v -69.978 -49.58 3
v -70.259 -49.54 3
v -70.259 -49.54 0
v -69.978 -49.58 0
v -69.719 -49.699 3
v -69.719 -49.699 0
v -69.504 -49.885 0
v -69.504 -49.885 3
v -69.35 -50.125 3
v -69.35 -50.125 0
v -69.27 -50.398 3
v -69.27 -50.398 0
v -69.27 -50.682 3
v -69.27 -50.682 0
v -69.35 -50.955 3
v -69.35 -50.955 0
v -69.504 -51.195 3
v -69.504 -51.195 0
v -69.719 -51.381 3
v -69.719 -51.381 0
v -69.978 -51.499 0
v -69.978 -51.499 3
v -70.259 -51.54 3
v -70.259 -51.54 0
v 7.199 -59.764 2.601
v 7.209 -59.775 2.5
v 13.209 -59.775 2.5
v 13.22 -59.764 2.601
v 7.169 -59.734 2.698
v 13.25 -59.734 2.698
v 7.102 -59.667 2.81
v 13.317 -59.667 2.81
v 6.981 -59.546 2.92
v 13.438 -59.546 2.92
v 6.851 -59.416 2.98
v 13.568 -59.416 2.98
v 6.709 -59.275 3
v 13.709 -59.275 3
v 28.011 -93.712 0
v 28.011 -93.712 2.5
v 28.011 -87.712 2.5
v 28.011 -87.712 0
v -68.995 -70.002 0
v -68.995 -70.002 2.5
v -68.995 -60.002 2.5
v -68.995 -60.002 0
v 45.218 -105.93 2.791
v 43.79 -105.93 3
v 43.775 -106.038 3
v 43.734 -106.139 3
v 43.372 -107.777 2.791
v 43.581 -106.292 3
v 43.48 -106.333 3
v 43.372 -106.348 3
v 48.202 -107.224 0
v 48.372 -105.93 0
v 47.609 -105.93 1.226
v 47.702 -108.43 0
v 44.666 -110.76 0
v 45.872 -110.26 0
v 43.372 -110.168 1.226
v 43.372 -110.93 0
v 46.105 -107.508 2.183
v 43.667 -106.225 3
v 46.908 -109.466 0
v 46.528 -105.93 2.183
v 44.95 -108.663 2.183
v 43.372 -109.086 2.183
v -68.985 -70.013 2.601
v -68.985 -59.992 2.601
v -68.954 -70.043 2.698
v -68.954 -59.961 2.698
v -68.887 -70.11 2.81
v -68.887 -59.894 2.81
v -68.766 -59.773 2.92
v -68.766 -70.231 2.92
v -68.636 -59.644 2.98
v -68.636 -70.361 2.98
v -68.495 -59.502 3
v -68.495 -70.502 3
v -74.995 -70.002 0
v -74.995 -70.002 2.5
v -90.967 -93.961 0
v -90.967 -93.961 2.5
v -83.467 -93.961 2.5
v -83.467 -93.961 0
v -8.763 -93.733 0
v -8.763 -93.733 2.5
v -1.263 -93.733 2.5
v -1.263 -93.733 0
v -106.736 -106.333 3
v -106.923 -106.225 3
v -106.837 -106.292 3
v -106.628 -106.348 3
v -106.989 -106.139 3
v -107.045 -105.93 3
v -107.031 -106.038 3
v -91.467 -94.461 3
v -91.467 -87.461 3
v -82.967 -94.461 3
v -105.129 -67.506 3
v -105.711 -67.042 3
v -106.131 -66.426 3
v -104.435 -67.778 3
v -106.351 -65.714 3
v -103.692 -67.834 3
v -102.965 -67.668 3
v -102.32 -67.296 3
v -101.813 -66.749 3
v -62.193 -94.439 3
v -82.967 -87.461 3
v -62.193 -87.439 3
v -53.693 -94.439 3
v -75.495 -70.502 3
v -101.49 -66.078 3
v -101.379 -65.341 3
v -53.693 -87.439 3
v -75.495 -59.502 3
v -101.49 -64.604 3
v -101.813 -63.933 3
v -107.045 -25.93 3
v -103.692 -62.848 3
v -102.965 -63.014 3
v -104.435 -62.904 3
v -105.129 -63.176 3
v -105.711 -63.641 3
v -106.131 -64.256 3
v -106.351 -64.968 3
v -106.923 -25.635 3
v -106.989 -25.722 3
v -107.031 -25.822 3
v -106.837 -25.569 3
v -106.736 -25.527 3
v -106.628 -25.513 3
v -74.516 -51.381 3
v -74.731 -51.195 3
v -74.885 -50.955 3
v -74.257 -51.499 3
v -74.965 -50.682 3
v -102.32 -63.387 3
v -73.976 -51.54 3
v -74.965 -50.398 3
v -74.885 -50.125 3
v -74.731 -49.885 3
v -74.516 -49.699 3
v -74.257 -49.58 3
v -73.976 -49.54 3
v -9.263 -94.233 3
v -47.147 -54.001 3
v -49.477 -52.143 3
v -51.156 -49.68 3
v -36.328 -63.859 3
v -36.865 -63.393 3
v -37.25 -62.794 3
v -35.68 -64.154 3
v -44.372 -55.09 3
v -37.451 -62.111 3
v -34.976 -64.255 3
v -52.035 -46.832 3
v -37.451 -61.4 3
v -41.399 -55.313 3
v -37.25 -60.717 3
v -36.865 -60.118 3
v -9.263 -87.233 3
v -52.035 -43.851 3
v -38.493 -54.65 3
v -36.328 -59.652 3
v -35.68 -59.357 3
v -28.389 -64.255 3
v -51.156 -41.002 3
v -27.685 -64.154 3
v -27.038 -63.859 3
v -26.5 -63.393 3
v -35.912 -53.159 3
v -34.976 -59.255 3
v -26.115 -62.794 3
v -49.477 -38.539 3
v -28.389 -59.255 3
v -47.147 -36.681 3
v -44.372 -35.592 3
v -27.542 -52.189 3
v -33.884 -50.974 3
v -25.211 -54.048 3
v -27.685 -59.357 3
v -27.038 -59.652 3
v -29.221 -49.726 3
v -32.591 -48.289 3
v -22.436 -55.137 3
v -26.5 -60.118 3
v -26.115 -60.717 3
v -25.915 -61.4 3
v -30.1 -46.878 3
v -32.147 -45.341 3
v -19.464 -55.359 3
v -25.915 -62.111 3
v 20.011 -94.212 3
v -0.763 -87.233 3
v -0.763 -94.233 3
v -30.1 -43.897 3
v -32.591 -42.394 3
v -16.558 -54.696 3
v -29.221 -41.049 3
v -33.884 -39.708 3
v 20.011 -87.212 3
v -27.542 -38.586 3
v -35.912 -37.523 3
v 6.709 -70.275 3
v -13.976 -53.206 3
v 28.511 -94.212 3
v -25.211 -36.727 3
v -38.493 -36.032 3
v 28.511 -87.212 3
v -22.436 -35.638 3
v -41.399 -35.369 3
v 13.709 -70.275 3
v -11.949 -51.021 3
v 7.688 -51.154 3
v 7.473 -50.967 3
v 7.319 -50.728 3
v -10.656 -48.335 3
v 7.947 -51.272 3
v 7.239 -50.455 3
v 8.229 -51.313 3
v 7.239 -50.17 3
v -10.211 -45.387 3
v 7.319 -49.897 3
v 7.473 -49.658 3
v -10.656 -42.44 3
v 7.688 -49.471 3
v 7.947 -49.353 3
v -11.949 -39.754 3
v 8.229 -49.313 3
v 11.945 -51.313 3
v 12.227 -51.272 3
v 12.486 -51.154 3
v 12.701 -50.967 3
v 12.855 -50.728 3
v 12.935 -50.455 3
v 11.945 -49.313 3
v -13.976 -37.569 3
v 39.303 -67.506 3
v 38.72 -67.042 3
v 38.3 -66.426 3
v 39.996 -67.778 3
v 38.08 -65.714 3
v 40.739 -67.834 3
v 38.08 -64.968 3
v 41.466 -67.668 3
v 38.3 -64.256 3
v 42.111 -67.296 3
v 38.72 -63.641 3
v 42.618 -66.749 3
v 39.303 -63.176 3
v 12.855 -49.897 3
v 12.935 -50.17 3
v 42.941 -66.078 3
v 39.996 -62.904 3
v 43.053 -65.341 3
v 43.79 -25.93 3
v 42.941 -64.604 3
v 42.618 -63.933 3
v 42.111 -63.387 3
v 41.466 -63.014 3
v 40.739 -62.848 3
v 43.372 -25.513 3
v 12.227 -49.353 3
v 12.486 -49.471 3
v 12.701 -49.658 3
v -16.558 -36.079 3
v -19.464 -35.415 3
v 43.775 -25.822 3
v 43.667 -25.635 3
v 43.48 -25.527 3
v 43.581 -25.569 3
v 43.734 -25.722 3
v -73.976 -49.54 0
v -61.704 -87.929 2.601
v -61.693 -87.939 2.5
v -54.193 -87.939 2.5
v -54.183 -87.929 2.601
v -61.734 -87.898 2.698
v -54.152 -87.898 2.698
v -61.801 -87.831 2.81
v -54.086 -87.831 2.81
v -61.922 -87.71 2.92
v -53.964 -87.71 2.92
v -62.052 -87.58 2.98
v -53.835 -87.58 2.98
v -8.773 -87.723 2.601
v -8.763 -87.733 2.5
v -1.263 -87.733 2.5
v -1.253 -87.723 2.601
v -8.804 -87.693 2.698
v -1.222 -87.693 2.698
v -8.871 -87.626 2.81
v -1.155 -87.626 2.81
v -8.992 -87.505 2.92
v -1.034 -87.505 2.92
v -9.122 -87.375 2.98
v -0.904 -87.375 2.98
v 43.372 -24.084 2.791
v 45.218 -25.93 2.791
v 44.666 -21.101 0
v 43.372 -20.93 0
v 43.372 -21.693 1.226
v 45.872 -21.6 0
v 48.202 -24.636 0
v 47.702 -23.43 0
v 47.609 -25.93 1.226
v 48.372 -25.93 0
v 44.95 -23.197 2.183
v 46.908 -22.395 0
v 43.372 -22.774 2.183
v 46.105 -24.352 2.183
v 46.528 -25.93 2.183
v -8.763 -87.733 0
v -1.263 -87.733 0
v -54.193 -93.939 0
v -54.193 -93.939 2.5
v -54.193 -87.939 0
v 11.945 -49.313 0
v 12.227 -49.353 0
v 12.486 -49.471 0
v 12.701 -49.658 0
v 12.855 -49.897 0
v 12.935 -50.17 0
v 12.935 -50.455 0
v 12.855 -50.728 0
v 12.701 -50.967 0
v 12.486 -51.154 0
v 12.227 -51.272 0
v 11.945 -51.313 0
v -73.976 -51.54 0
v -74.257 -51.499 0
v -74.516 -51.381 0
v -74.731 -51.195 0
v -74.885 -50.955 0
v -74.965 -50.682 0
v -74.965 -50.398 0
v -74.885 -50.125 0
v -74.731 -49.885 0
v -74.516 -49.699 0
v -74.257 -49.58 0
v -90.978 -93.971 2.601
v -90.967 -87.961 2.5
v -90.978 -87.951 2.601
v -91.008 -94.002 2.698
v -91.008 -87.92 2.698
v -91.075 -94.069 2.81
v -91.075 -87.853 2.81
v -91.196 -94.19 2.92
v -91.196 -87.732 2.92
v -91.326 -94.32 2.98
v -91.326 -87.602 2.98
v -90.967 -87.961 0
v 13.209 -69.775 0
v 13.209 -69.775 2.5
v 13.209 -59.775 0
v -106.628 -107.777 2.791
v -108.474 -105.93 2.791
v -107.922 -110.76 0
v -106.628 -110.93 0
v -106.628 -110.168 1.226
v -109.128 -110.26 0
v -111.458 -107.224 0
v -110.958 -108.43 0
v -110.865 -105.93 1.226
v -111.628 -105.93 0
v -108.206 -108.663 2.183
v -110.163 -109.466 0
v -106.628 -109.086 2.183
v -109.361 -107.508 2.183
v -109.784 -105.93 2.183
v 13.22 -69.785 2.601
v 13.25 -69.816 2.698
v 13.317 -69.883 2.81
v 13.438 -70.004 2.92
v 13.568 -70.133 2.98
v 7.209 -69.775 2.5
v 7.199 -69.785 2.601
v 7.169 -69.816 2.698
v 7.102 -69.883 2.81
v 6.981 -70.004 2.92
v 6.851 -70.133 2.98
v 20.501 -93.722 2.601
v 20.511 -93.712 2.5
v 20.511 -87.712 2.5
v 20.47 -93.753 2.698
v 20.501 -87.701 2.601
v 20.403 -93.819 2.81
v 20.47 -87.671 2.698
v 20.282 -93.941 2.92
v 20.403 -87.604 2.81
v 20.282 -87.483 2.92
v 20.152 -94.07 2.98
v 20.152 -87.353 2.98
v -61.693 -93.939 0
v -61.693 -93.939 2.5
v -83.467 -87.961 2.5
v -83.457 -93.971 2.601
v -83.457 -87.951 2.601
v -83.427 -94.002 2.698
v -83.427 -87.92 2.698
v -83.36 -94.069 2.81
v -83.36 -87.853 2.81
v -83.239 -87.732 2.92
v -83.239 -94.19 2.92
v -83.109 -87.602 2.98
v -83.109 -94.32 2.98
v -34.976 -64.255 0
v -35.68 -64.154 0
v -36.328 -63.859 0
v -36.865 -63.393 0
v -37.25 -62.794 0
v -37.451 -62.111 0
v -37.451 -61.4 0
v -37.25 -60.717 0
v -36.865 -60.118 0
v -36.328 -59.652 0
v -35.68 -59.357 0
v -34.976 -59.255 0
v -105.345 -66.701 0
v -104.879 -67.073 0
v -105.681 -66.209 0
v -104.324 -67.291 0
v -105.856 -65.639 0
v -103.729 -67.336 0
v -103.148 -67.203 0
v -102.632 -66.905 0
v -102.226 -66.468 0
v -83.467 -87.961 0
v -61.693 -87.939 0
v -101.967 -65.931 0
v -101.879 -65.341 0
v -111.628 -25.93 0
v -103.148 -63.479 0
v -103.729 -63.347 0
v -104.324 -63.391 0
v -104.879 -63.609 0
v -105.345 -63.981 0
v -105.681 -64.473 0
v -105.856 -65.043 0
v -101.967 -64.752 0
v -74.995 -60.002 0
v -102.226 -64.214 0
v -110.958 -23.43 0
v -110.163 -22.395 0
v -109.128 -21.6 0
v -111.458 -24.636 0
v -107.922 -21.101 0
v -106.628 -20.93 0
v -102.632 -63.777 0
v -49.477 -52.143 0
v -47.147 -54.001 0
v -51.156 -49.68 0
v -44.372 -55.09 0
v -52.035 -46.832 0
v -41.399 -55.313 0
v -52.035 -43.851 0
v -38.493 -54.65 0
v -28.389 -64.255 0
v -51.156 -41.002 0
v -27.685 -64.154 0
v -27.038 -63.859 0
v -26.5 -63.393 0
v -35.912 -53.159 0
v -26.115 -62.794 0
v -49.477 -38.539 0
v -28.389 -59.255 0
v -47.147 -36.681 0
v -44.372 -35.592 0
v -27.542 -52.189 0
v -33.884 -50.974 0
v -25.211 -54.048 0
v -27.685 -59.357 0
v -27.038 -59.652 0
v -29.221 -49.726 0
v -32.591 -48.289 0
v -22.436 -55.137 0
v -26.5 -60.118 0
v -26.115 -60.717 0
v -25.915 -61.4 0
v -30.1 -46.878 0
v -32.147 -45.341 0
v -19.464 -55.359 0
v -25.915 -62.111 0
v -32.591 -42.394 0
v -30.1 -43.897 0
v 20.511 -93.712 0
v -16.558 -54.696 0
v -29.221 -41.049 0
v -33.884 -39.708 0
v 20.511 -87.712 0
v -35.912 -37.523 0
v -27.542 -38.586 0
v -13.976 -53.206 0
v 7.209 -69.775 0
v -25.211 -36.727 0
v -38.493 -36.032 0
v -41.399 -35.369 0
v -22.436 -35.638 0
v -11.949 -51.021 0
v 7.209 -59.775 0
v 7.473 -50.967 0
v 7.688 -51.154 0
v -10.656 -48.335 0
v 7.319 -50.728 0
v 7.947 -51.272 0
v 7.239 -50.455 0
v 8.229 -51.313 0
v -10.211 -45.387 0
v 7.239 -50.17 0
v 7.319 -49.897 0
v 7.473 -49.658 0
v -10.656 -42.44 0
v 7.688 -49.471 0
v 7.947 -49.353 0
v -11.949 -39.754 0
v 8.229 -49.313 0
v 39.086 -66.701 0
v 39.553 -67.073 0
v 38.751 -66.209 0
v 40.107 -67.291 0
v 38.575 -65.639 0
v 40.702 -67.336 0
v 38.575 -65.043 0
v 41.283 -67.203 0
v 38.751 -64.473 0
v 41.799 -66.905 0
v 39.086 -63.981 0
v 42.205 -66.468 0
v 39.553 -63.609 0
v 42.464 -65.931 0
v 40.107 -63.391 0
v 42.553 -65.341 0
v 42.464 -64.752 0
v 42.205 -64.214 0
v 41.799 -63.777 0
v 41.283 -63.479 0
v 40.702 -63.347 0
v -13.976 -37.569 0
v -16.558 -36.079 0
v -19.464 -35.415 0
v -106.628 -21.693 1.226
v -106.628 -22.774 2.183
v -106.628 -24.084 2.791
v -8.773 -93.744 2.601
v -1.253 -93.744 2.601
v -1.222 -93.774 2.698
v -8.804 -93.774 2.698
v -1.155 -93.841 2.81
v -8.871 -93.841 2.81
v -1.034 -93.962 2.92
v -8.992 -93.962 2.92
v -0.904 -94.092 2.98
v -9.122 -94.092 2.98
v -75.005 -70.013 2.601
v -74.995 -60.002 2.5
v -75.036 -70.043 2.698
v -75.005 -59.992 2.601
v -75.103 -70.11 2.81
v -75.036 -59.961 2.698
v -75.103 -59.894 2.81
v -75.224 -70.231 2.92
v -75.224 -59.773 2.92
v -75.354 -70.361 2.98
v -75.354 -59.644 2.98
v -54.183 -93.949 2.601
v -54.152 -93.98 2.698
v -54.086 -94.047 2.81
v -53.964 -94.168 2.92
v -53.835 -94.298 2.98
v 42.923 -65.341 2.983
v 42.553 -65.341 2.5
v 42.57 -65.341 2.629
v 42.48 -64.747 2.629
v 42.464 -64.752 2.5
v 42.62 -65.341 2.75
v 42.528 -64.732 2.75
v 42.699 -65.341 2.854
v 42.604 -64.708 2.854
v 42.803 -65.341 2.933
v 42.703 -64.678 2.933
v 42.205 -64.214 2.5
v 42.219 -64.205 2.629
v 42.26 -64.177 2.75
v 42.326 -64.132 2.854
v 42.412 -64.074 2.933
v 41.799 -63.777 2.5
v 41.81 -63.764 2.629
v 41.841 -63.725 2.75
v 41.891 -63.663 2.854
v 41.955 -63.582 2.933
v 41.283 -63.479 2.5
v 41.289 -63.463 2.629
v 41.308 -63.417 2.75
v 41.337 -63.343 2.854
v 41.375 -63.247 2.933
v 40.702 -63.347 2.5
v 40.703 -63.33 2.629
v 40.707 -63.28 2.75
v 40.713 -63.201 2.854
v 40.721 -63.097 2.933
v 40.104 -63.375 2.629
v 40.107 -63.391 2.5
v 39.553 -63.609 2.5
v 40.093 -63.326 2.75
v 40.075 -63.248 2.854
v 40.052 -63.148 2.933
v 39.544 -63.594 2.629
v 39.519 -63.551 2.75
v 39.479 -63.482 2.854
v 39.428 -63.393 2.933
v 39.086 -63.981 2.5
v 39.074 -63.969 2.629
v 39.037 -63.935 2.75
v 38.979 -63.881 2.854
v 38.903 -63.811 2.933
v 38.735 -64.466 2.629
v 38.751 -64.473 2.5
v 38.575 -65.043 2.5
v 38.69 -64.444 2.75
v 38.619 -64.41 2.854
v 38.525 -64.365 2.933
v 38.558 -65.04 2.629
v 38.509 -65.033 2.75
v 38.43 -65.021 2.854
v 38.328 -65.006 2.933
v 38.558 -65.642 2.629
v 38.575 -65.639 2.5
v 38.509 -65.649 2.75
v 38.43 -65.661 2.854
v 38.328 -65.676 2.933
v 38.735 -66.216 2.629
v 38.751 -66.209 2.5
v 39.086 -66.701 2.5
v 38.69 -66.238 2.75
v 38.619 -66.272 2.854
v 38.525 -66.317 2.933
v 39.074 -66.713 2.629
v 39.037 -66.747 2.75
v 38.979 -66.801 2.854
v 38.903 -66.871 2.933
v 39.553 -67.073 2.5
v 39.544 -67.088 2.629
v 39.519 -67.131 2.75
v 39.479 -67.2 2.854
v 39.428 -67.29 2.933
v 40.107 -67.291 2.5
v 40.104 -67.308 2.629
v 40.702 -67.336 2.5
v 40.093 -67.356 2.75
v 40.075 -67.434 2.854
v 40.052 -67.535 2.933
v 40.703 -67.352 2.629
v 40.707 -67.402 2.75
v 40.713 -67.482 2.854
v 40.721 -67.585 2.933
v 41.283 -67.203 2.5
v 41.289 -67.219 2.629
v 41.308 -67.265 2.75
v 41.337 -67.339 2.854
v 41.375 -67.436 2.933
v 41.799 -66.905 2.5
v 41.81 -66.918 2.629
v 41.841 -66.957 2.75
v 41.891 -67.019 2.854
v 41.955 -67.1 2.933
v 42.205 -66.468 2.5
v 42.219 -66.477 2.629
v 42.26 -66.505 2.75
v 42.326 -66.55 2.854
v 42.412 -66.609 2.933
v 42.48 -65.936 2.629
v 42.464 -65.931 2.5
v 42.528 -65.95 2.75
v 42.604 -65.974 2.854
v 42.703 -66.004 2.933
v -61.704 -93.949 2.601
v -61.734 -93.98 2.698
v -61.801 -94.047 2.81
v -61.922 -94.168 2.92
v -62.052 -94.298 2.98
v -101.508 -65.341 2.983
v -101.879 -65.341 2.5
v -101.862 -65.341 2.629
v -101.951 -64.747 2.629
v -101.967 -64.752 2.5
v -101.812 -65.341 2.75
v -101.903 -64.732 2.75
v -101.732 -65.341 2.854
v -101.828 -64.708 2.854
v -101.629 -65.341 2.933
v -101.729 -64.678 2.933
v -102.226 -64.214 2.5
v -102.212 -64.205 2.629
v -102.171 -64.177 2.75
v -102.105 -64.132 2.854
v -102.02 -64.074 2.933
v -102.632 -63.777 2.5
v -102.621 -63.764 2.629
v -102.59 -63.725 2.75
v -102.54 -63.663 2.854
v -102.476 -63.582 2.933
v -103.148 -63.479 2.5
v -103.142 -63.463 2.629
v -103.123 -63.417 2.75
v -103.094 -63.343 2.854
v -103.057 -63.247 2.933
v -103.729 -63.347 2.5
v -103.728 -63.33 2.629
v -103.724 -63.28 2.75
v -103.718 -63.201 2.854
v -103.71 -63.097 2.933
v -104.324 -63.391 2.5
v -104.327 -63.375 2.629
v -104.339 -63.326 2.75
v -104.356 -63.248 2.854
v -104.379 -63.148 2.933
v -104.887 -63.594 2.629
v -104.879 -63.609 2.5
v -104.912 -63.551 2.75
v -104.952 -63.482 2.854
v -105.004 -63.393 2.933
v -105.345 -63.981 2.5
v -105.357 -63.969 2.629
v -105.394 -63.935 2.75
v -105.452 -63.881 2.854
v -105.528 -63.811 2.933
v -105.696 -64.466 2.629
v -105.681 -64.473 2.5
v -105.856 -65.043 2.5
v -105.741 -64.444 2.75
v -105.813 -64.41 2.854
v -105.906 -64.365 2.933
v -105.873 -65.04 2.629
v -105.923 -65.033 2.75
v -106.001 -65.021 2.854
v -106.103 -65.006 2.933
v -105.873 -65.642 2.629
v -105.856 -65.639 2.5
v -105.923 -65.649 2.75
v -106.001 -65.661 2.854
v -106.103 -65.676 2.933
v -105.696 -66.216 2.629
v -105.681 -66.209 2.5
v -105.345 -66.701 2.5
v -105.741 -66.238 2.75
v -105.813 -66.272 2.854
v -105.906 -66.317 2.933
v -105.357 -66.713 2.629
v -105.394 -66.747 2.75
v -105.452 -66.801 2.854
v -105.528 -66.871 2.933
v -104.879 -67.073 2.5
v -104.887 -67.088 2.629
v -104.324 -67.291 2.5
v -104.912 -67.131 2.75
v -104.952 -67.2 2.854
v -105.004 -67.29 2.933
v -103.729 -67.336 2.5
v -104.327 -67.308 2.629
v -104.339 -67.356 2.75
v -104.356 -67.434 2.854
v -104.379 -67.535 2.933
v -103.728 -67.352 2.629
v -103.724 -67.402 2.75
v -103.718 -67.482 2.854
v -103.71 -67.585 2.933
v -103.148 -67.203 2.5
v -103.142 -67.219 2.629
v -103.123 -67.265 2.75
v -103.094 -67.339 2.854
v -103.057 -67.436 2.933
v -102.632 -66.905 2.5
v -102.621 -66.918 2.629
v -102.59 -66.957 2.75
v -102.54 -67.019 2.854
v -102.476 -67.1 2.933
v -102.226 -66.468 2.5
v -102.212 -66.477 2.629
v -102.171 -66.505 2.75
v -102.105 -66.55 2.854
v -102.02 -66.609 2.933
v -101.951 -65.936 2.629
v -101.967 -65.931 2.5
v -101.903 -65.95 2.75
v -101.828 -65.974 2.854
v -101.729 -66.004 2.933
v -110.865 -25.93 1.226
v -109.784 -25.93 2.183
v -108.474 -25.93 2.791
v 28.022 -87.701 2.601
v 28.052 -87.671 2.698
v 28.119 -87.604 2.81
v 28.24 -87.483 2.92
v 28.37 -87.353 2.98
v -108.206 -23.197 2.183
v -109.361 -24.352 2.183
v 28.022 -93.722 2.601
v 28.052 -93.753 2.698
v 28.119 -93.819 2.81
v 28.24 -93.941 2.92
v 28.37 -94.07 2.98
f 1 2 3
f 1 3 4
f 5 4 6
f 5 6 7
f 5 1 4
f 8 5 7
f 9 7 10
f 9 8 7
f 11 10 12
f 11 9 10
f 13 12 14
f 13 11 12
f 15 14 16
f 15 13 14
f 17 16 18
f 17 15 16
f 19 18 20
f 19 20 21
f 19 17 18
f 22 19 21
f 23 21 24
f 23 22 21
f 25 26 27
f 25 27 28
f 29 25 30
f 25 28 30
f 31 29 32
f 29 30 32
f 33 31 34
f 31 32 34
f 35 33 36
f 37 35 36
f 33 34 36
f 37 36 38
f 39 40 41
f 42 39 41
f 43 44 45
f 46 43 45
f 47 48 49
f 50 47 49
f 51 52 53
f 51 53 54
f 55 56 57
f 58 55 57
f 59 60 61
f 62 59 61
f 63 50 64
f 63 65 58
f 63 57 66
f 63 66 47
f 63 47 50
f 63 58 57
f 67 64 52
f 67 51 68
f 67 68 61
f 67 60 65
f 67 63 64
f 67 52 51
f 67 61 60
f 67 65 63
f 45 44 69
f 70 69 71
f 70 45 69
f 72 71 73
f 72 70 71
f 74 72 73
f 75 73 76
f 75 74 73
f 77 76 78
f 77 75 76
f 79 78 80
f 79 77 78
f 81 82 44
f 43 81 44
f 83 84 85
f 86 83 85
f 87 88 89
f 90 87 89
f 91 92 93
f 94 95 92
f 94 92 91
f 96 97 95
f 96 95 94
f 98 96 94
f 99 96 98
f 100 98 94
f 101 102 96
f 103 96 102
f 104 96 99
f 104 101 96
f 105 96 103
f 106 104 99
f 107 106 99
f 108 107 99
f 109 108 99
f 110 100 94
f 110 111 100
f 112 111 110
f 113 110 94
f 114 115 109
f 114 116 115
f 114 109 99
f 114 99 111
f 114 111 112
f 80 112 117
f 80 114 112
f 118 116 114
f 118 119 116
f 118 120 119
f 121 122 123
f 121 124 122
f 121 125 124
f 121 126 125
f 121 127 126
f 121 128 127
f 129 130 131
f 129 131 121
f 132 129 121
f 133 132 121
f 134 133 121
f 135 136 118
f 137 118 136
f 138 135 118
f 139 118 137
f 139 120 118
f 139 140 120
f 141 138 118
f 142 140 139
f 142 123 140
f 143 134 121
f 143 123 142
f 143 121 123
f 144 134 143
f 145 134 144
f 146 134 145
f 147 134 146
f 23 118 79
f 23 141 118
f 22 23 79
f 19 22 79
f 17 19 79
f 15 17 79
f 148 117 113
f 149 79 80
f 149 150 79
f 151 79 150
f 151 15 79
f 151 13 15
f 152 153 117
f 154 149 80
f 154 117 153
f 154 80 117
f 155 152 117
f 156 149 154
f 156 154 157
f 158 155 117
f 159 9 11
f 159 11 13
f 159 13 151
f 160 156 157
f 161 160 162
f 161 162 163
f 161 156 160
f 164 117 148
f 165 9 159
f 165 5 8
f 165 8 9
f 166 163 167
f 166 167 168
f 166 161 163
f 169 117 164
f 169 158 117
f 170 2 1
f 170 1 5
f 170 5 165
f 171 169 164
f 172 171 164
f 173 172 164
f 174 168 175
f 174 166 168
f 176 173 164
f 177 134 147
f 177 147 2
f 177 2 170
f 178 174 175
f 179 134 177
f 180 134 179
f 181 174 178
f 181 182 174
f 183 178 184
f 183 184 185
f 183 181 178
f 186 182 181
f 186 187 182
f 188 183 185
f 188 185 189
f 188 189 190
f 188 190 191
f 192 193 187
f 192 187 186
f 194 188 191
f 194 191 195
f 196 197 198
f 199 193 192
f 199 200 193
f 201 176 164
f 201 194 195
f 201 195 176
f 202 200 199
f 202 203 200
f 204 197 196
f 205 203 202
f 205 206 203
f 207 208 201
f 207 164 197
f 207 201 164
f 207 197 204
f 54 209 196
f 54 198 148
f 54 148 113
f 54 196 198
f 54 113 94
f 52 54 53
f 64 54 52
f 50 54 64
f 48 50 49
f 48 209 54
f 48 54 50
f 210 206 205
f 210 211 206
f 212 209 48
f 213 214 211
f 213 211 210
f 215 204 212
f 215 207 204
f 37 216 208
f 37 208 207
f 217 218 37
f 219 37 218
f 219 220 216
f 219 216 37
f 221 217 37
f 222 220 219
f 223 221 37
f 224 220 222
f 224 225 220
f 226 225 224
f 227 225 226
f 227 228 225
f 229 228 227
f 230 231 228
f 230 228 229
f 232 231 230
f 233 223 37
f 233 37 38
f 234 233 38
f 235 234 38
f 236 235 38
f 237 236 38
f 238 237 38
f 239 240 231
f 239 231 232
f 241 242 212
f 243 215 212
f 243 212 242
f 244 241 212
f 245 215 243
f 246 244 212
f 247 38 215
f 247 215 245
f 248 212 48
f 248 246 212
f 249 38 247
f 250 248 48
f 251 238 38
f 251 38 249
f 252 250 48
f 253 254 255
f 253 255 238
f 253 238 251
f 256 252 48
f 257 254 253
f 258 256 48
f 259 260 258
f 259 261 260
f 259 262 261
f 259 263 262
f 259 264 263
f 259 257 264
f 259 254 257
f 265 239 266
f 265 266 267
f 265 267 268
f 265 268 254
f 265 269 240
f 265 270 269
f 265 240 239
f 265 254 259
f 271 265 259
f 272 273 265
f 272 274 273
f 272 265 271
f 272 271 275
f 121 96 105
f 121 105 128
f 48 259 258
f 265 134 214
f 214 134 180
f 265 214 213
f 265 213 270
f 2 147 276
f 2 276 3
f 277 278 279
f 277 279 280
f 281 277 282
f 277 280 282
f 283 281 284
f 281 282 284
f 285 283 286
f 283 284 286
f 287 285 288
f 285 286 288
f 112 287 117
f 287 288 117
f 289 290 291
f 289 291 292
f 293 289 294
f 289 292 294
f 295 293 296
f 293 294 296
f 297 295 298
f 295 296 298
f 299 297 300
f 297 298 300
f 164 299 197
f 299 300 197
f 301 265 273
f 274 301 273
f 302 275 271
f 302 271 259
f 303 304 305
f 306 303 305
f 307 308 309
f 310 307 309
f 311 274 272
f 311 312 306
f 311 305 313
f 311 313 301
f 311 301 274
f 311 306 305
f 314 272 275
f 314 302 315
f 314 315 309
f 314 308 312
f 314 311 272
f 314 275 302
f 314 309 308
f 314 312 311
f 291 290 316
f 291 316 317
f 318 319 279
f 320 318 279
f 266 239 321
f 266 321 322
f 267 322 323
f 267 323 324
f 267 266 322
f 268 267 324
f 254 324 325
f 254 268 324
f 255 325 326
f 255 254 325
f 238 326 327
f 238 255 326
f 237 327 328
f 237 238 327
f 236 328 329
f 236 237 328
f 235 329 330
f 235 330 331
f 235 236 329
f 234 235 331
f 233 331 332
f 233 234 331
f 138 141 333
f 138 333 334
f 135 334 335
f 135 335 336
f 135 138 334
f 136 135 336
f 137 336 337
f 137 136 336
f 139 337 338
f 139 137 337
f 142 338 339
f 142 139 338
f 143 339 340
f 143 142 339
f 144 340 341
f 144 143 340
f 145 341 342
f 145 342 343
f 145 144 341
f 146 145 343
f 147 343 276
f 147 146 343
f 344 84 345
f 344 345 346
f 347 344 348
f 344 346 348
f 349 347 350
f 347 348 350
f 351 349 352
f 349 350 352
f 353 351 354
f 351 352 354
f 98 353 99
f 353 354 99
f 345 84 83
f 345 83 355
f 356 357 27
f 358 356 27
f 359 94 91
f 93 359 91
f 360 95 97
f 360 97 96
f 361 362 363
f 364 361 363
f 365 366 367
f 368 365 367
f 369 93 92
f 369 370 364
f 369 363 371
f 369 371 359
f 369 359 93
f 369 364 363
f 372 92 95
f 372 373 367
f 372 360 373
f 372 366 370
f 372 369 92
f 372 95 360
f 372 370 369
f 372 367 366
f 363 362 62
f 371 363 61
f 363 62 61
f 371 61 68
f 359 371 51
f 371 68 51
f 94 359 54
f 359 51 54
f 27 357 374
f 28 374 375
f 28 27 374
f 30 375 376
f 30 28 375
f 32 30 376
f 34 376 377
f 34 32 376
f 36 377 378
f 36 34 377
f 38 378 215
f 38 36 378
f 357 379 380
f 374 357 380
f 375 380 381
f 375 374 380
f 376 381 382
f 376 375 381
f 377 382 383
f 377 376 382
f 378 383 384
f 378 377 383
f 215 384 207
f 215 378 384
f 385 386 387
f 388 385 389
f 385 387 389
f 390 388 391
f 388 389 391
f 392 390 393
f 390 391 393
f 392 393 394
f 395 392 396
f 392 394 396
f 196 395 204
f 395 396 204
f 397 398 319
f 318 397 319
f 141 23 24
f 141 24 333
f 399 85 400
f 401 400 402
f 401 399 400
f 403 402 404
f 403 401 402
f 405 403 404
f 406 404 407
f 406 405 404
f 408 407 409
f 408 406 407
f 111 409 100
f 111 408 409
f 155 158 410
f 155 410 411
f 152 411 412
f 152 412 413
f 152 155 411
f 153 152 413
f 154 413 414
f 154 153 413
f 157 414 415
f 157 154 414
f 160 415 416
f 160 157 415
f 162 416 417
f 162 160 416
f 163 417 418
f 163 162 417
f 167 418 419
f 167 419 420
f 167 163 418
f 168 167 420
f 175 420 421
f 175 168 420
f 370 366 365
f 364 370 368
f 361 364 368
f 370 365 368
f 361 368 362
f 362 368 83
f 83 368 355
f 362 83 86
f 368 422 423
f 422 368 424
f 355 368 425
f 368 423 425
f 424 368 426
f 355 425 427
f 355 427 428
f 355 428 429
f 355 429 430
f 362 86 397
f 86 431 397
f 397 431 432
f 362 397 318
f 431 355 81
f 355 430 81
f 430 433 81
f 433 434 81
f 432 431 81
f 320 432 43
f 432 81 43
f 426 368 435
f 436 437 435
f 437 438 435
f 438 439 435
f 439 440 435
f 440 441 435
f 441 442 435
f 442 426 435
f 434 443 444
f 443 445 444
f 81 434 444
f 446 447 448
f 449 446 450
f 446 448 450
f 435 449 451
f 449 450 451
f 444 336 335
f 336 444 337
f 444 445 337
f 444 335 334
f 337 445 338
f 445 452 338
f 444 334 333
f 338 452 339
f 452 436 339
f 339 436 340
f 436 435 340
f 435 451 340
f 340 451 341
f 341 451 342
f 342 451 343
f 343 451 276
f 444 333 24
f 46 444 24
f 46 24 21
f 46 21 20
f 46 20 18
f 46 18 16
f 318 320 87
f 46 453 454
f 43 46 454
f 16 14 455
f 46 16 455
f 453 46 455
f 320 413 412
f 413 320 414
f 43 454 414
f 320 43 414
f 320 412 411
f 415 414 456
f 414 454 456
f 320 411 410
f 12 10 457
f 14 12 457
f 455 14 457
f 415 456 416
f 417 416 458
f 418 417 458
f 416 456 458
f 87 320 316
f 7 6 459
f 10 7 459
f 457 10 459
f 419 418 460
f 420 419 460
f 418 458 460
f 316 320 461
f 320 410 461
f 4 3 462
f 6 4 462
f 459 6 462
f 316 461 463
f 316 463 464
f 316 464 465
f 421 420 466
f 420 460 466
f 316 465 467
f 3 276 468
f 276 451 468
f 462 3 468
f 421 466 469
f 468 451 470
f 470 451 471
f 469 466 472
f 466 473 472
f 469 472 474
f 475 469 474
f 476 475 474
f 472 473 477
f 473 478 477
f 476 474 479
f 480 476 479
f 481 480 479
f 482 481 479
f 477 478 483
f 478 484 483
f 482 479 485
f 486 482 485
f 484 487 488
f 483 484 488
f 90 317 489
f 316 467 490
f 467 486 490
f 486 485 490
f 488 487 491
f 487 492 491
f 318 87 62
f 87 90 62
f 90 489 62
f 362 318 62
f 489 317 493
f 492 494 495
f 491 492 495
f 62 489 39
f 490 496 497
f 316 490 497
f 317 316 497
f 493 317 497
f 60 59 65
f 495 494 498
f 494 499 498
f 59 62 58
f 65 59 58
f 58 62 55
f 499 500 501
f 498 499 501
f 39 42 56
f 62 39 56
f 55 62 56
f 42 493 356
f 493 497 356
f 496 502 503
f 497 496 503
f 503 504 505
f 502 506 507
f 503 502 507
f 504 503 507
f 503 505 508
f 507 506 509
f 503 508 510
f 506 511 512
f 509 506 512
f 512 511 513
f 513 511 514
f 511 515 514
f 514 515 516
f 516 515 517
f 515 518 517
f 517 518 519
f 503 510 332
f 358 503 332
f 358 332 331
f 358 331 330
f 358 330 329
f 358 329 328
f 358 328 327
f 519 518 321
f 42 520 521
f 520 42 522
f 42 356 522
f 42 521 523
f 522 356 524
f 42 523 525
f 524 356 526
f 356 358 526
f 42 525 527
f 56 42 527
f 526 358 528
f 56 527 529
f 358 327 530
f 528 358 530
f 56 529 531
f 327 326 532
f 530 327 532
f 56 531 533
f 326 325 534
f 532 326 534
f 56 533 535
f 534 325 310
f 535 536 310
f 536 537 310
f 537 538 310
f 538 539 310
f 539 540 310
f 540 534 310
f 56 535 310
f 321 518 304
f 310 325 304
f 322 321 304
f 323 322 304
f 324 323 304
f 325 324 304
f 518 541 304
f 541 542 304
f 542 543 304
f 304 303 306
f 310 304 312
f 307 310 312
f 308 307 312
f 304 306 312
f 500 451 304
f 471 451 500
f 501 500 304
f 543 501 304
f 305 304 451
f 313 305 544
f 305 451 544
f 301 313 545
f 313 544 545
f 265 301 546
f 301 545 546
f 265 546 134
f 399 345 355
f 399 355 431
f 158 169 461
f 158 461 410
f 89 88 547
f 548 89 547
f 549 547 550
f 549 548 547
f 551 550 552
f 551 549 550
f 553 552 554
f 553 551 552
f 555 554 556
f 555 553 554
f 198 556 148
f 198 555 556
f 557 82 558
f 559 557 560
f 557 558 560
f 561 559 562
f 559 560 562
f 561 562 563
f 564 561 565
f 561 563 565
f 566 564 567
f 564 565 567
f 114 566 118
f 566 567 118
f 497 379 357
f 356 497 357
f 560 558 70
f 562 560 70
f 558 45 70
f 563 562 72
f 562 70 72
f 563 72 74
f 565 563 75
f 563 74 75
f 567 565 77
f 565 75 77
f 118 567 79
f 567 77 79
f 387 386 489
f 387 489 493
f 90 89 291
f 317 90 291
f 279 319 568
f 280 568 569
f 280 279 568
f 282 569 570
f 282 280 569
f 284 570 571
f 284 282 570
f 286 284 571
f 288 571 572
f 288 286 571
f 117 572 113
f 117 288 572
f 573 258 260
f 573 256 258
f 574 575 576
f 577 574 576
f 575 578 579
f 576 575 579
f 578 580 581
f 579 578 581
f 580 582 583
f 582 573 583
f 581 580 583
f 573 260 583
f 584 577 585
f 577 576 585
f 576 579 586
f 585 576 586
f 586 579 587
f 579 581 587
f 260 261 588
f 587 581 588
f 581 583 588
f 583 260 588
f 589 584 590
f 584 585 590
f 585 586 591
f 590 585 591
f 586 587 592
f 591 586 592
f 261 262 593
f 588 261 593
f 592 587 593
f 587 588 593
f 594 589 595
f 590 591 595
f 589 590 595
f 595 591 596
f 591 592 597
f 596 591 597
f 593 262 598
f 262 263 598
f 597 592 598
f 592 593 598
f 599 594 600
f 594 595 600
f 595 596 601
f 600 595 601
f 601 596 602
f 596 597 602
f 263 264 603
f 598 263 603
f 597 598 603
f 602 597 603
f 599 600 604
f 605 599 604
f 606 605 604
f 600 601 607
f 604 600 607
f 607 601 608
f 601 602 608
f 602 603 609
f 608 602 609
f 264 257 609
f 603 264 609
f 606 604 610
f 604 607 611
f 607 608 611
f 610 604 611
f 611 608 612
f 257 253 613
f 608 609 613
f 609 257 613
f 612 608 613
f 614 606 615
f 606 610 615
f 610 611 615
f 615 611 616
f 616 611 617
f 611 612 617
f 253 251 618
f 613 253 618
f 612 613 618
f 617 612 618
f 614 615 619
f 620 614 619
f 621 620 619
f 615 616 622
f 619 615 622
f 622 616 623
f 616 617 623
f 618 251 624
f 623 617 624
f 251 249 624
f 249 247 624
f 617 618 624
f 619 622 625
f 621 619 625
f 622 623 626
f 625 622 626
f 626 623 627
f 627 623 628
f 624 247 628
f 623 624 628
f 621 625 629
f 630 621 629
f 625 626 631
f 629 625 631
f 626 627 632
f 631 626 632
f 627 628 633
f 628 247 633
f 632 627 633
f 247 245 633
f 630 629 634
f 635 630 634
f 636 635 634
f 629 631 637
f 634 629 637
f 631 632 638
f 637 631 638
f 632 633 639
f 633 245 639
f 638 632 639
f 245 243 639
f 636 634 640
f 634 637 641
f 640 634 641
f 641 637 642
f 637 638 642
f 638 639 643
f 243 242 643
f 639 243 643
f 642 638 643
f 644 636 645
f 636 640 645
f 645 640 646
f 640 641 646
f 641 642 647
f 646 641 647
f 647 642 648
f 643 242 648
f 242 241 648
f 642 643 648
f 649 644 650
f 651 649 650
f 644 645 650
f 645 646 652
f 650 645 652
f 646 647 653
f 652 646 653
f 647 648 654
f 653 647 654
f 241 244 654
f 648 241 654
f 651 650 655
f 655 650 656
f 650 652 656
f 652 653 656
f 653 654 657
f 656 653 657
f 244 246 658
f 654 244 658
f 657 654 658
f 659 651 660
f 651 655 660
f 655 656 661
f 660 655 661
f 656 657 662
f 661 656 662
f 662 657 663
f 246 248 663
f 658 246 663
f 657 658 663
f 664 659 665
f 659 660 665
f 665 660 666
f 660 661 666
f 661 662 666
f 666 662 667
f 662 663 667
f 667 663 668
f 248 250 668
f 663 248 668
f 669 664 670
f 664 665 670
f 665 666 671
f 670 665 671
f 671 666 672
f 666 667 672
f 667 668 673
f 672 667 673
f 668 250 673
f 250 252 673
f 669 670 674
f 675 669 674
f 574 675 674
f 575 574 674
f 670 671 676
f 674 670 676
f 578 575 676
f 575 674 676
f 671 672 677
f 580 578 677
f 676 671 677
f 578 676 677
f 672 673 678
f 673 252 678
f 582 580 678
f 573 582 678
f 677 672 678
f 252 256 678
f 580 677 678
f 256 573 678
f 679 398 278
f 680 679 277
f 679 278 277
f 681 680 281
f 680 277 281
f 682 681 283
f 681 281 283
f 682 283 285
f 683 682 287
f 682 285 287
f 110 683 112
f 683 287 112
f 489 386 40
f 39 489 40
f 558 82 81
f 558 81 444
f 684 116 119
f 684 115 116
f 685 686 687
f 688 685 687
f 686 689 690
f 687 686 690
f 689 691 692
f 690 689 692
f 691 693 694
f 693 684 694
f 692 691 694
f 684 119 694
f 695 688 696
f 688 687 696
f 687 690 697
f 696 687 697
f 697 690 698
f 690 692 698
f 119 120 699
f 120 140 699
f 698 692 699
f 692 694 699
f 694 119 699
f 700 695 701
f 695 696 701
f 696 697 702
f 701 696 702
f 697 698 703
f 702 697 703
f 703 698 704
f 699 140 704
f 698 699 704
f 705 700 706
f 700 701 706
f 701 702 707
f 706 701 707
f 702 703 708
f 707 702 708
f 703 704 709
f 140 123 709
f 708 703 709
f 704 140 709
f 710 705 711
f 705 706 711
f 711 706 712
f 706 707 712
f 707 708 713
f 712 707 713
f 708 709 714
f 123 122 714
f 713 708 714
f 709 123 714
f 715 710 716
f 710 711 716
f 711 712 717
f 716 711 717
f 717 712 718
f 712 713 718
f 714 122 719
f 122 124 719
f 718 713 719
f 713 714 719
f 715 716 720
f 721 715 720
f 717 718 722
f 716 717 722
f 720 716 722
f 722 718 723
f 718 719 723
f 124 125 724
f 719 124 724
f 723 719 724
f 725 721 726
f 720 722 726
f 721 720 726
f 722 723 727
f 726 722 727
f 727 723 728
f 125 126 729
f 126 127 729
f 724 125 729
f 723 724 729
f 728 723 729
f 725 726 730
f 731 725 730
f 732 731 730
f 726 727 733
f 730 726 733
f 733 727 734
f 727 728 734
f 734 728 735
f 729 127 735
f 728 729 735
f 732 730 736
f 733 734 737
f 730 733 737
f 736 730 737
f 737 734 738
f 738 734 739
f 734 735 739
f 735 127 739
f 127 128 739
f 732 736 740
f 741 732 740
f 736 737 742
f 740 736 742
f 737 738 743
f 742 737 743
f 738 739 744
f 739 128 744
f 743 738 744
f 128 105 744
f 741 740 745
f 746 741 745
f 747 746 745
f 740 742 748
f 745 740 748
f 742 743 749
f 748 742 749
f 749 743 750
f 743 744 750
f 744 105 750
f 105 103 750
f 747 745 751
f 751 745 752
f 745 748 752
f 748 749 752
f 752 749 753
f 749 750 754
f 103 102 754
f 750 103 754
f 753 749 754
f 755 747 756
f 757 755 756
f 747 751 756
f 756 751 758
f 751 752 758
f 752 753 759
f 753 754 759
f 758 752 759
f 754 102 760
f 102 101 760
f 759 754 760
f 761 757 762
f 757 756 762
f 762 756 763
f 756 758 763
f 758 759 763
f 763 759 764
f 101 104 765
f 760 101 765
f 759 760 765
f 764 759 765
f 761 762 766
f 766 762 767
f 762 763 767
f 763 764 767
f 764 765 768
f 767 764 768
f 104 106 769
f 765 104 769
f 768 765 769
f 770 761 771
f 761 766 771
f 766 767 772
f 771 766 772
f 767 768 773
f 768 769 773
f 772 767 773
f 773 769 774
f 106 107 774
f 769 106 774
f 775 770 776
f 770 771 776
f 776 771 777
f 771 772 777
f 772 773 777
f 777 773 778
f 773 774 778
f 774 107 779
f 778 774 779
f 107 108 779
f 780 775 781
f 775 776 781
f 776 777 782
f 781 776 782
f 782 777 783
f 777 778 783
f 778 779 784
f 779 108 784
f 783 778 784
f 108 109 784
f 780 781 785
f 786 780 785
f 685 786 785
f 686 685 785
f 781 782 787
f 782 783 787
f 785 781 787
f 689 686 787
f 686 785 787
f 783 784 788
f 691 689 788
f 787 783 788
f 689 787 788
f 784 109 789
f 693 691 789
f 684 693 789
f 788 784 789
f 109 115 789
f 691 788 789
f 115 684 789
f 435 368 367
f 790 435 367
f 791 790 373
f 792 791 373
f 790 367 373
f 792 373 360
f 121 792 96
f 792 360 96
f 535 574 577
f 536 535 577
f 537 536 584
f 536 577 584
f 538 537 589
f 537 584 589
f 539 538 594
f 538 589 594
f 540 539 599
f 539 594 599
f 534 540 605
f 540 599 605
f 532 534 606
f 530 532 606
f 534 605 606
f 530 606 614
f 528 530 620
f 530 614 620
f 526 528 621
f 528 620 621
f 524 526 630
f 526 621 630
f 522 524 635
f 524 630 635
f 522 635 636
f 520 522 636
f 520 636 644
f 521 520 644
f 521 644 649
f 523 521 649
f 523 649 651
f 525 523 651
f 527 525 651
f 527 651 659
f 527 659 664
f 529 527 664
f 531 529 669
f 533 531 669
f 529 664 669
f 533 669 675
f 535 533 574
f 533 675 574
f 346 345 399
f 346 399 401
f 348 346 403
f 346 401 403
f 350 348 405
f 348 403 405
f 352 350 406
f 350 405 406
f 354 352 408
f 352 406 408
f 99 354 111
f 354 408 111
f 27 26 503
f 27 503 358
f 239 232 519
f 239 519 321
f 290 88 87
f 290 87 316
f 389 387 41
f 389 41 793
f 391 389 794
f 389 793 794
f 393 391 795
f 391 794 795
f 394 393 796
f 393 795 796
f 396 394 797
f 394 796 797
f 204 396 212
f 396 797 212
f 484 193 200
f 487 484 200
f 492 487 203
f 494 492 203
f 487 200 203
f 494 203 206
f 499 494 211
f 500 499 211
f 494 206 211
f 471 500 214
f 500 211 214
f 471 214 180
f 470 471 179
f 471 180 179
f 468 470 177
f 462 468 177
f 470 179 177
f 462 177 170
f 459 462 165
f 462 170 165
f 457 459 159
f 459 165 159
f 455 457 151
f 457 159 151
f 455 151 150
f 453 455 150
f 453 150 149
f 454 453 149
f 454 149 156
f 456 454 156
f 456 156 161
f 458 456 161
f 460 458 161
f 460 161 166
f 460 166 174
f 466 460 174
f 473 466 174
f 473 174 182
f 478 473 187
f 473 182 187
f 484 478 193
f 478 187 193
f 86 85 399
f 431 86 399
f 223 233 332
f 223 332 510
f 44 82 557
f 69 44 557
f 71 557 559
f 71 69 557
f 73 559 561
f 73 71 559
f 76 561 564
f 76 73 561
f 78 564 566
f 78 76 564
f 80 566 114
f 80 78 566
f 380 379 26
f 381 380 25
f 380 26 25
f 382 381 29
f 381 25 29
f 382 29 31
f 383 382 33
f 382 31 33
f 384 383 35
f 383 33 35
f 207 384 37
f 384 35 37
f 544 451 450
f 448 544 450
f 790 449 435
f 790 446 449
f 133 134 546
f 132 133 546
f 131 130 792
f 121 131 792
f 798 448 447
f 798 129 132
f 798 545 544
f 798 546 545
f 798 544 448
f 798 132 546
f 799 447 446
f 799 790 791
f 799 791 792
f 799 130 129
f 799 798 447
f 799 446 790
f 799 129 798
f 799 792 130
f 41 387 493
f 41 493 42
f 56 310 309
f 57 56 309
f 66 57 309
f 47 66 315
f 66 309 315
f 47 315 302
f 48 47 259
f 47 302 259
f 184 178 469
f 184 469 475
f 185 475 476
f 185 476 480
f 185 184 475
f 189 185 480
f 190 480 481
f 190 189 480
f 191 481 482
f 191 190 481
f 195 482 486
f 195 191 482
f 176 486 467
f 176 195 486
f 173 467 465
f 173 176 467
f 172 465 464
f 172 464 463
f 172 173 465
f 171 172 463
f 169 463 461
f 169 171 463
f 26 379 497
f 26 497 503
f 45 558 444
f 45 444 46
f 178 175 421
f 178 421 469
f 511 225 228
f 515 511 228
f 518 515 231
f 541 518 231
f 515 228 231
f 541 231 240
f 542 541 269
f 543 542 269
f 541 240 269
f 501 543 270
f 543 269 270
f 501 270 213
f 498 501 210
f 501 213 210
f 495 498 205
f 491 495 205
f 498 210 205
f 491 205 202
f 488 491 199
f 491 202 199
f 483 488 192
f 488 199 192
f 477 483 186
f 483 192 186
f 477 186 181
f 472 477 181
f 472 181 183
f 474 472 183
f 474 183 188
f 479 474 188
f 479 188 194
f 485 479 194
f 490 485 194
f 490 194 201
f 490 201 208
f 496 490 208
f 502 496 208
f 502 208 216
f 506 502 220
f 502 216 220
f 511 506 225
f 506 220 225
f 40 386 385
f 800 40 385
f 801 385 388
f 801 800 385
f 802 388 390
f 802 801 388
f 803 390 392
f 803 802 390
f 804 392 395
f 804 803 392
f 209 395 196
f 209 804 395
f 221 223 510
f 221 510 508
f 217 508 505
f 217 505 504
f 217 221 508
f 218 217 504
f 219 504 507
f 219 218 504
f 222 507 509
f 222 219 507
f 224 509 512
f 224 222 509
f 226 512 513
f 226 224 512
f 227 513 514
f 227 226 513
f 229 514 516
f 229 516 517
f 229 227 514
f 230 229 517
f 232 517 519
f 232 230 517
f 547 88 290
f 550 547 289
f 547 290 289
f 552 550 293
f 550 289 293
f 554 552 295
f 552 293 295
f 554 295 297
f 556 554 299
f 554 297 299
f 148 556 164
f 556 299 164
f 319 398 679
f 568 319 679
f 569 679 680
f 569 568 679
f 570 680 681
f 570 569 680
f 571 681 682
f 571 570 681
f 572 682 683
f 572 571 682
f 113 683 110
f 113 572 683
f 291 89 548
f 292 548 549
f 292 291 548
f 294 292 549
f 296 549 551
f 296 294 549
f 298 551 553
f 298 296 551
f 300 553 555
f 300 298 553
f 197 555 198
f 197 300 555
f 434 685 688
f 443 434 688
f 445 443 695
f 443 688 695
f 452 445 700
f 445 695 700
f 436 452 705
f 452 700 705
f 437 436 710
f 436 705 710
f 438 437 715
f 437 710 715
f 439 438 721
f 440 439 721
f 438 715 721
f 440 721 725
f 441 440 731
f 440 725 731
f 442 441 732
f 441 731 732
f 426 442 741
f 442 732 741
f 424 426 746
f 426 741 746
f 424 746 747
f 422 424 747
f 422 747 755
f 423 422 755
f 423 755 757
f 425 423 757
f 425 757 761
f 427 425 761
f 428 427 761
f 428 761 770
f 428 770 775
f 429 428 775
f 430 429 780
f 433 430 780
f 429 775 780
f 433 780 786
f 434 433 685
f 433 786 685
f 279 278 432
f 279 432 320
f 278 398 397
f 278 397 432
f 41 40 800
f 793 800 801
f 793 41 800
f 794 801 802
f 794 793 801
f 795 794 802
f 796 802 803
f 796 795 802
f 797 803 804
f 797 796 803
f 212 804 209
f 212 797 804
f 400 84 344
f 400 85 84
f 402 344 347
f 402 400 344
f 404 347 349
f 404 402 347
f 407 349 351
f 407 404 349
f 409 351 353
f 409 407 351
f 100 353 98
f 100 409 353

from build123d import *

# Parameters (mm, degrees)
SKETCH1_W           = 160
SKETCH1_H           = 90
BOSS_EXTRUDE8_DEPTH = 3
FILLET15_R          = 5
FILLET16_R          = 5
SKETCH14_R          = 10
SKETCH14_R_2        = 2
SKETCH14_W          = 7.5
SKETCH14_H          = 6
SKETCH14_W_2        = 6
SKETCH14_H_2        = 10
CUT_EXTRUDE1_DEPTH  = 3
FILLET17_R          = 0.5


with BuildPart() as part:
    # Sketch1 → Boss-Extrude8 (new body)
    with BuildSketch(Plane.XY):
        with Locations((-31.627906977, -65.930232558)):
            Rectangle(SKETCH1_W, SKETCH1_H)
    extrude(amount=BOSS_EXTRUDE8_DEPTH)

    # Fillet15
    fillet15_edges = [part.edges().sort_by_distance(p)[0] for p in [
        (-111.627906977, -20.930232558, 1.5),
        (48.372093023, -20.930232558, 1.5),
        (48.372093023, -110.930232558, 1.5),
        (-111.627906977, -110.930232558, 1.5),
    ]]
    fillet(fillet15_edges, radius=FILLET15_R)

    # Fillet16
    # the kernel refuses this fillet: 5 mm, written as the material it takes off along each edge
    with BuildSketch(Plane(origin=(-106.627906977, -25.930232558, 3), x_dir=(0, 1, 0), z_dir=(1, 0, 0))) as fillet16_piece_1:
        with BuildLine():
            CenterArc((0.417424305, -5), FILLET16_R, 23.578178478, 66.421821522)
            Line((0.417424305, 0), (0.417424305, 0.1))
            Line((0.417424305, 0.1), (5, 0.1))
            Line((5, 0.1), (5.1, 0))
            ThreePointArc((5.1, 0), (5.1, -1.5), (5.091651514, -2.96))
            Line((5.091651514, -2.96), (5, -3))
        make_face()
    revolve(axis=Axis((-106.627906977, -25.930232558, 3), (0, 0, 1)), revolution_arc=90, mode=Mode.SUBTRACT)
    with BuildSketch(Plane(origin=(-106.627906977, -20.930232558, 3), x_dir=(0, 0, -1), z_dir=(1, 0, 0))) as fillet16_piece_2:
        with BuildLine():
            CenterArc((5, -4.582575695), FILLET16_R, 113.578178478, 66.421821522)
            Line((0, -4.582575695), (-0.1, -4.582575695))
            Line((-0.1, -4.582575695), (-0.1, 0))
            Line((-0.1, 0), (0, 0.1))
            ThreePointArc((0, 0.1), (1.5, 0.1), (2.96, 0.091651514))
            Line((2.96, 0.091651514), (3, 0))
        make_face()
    extrude(amount=150, mode=Mode.SUBTRACT)
    with BuildSketch(Plane(origin=(43.372093023, -25.930232558, 3), x_dir=(0, 1, 0), z_dir=(-1, 0, 0))) as fillet16_piece_3:
        with BuildLine():
            CenterArc((0.417424305, 5), FILLET16_R, 270, 66.421821522)
            Line((0.417424305, 0), (0.417424305, -0.1))
            Line((0.417424305, -0.1), (5, -0.1))
            Line((5, -0.1), (5.1, 0))
            ThreePointArc((5.1, 0), (5.1, 1.5), (5.091651514, 2.96))
            Line((5.091651514, 2.96), (5, 3))
        make_face()
    revolve(axis=Axis((43.372093023, -25.930232558, 3), (0, 0, -1)), revolution_arc=90, mode=Mode.SUBTRACT)
    with BuildSketch(Plane(origin=(48.372093023, -25.930232558, 3), x_dir=(-1, 0, 0), z_dir=(0, -1, 0)), Plane(origin=(-111.627906977, -105.930232558, 3), x_dir=(1, 0, 0), z_dir=(0, 1, 0))) as fillet16_piece_4:
        with BuildLine():
            CenterArc((4.582575695, 5), FILLET16_R, 203.578178478, 66.421821522)
            Line((0, 3), (-0.091651514, 2.96))
            ThreePointArc((-0.091651514, 2.96), (-0.1, 1.5), (-0.1, 0))
            Line((-0.1, 0), (0, -0.1))
            Line((0, -0.1), (4.582575695, -0.1))
            Line((4.582575695, -0.1), (4.582575695, 0))
        make_face()
    extrude(amount=80, mode=Mode.SUBTRACT)
    with BuildSketch(Plane(origin=(43.372093023, -105.930232558, 3), x_dir=(1, 0, 0), z_dir=(0, 1, 0))) as fillet16_piece_5:
        with BuildLine():
            CenterArc((0.417424305, 5), FILLET16_R, 270, 66.421821522)
            Line((5, 3), (5.091651514, 2.96))
            ThreePointArc((5.091651514, 2.96), (5.1, 1.5), (5.1, 0))
            Line((5.1, 0), (5, -0.1))
            Line((5, -0.1), (0.417424305, -0.1))
            Line((0.417424305, -0.1), (0.417424305, 0))
        make_face()
    revolve(axis=Axis((43.372093023, -105.930232558, 3), (0, 0, -1)), revolution_arc=90, mode=Mode.SUBTRACT)
    with BuildSketch(Plane(origin=(43.372093023, -110.930232558, 3), x_dir=(0, 1, 0), z_dir=(-1, 0, 0))) as fillet16_piece_6:
        with BuildLine():
            CenterArc((4.582575695, 5), FILLET16_R, 203.578178478, 66.421821522)
            Line((0, 3), (-0.091651514, 2.96))
            ThreePointArc((-0.091651514, 2.96), (-0.1, 1.5), (-0.1, 0))
            Line((-0.1, 0), (0, -0.1))
            Line((0, -0.1), (4.582575695, -0.1))
            Line((4.582575695, -0.1), (4.582575695, 0))
        make_face()
    extrude(amount=150, mode=Mode.SUBTRACT)
    with BuildSketch(Plane(origin=(-106.627906977, -105.930232558, 3), x_dir=(0, -1, 0), z_dir=(1, 0, 0))) as fillet16_piece_7:
        with BuildLine():
            CenterArc((0.417424305, 5), FILLET16_R, 270, 66.421821522)
            Line((5, 3), (5.091651514, 2.96))
            ThreePointArc((5.091651514, 2.96), (5.1, 1.5), (5.1, 0))
            Line((5.1, 0), (5, -0.1))
            Line((5, -0.1), (0.417424305, -0.1))
            Line((0.417424305, -0.1), (0.417424305, 0))
        make_face()
    revolve(axis=Axis((-106.627906977, -105.930232558, 3), (0, 0, -1)), revolution_arc=90, mode=Mode.SUBTRACT)

    # Sketch14 → Cut-Extrude1 (cut)
    with BuildSketch(Plane.XY.offset(3)):
        with Locations((-42.146770789, -45.341082591)):
            Circle(SKETCH14_R)
        with Locations((-103.87862187, -65.341099016)):
            Circle(SKETCH14_R_2)
        with Locations((40.552517345, -65.341099016)):
            Circle(SKETCH14_R_2)
        with Locations((-20.211230278, -45.387431922)):
            Circle(SKETCH14_R)
        with Locations((-57.943307222, -90.939107411)):
            Rectangle(SKETCH14_W, SKETCH14_H)
        with Locations((-71.994996652, -65.002222921)):
            Rectangle(SKETCH14_W_2, SKETCH14_H_2)
        with Locations((-87.217465232, -90.960925791)):
            Rectangle(SKETCH14_W, SKETCH14_H)
        with BuildLine():
            Line((-73.975530372, -49.539987585), (-70.259376522, -49.539987585))
            ThreePointArc((-70.259376522, -49.539987585), (-69.259376522, -50.539987585), (-70.259376522, -51.539987585))
            Line((-70.259376522, -51.539987585), (-73.975530372, -51.539987585))
            ThreePointArc((-73.975530372, -51.539987585), (-74.975530372, -50.539987585), (-73.975530372, -49.539987585))
        make_face()
        with Locations((24.261172399, -90.711648075)):
            Rectangle(SKETCH14_W, SKETCH14_H)
        with Locations((10.209482969, -64.774763585)):
            Rectangle(SKETCH14_W_2, SKETCH14_H_2)
        with Locations((-5.012985611, -90.733466455)):
            Rectangle(SKETCH14_W, SKETCH14_H)
        with BuildLine():
            Line((8.228949249, -49.312528249), (11.945103099, -49.312528249))
            ThreePointArc((11.945103099, -49.312528249), (12.945103099, -50.312528249), (11.945103099, -51.312528249))
            Line((11.945103099, -51.312528249), (8.228949249, -51.312528249))
            ThreePointArc((8.228949249, -51.312528249), (7.228949249, -50.312528249), (8.228949249, -49.312528249))
        make_face()
        with BuildLine():
            Line((-34.976059895, -59.255469081), (-28.389202639, -59.255469081))
            ThreePointArc((-28.389202639, -59.255469081), (-25.889202639, -61.755469081), (-28.389202639, -64.255469081))
            Line((-28.389202639, -64.255469081), (-34.976059895, -64.255469081))
            ThreePointArc((-34.976059895, -64.255469081), (-37.476059895, -61.755469081), (-34.976059895, -59.255469081))
        make_face()
    extrude(amount=-CUT_EXTRUDE1_DEPTH, mode=Mode.SUBTRACT)

    # Fillet17
    fillet17_edges = [part.edges().sort_by_distance(p)[0] for p in [
        (20.511172399, -90.711648075, 3),
        (24.261172399, -93.711648075, 3),
        (28.011172399, -90.711648075, 3),
        (24.261172399, -87.711648075, 3),
        (-8.762985611, -90.733466455, 3),
        (-5.012985611, -93.733466455, 3),
        (-1.262985611, -90.733466455, 3),
        (-5.012985611, -87.733466455, 3),
        (7.209482969, -64.774763585, 3),
        (10.209482969, -69.774763585, 3),
        (13.209482969, -64.774763585, 3),
        (10.209482969, -59.774763585, 3),
        (-61.693307222, -90.939107411, 3),
        (-57.943307222, -93.939107411, 3),
        (-54.193307222, -90.939107411, 3),
        (-57.943307222, -87.939107411, 3),
        (-90.967465232, -90.960925791, 3),
        (-87.217465232, -93.960925791, 3),
        (-83.467465232, -90.960925791, 3),
        (-87.217465232, -87.960925791, 3),
        (38.552517345, -65.341099016, 3),
        (-105.87862187, -65.341099016, 3),
        (-74.994996652, -65.002222921, 3),
        (-71.994996652, -70.002222921, 3),
        (-68.994996652, -65.002222921, 3),
        (-71.994996652, -60.002222921, 3),
    ]]
    fillet(fillet17_edges, radius=FILLET17_R)


solid = part.part
